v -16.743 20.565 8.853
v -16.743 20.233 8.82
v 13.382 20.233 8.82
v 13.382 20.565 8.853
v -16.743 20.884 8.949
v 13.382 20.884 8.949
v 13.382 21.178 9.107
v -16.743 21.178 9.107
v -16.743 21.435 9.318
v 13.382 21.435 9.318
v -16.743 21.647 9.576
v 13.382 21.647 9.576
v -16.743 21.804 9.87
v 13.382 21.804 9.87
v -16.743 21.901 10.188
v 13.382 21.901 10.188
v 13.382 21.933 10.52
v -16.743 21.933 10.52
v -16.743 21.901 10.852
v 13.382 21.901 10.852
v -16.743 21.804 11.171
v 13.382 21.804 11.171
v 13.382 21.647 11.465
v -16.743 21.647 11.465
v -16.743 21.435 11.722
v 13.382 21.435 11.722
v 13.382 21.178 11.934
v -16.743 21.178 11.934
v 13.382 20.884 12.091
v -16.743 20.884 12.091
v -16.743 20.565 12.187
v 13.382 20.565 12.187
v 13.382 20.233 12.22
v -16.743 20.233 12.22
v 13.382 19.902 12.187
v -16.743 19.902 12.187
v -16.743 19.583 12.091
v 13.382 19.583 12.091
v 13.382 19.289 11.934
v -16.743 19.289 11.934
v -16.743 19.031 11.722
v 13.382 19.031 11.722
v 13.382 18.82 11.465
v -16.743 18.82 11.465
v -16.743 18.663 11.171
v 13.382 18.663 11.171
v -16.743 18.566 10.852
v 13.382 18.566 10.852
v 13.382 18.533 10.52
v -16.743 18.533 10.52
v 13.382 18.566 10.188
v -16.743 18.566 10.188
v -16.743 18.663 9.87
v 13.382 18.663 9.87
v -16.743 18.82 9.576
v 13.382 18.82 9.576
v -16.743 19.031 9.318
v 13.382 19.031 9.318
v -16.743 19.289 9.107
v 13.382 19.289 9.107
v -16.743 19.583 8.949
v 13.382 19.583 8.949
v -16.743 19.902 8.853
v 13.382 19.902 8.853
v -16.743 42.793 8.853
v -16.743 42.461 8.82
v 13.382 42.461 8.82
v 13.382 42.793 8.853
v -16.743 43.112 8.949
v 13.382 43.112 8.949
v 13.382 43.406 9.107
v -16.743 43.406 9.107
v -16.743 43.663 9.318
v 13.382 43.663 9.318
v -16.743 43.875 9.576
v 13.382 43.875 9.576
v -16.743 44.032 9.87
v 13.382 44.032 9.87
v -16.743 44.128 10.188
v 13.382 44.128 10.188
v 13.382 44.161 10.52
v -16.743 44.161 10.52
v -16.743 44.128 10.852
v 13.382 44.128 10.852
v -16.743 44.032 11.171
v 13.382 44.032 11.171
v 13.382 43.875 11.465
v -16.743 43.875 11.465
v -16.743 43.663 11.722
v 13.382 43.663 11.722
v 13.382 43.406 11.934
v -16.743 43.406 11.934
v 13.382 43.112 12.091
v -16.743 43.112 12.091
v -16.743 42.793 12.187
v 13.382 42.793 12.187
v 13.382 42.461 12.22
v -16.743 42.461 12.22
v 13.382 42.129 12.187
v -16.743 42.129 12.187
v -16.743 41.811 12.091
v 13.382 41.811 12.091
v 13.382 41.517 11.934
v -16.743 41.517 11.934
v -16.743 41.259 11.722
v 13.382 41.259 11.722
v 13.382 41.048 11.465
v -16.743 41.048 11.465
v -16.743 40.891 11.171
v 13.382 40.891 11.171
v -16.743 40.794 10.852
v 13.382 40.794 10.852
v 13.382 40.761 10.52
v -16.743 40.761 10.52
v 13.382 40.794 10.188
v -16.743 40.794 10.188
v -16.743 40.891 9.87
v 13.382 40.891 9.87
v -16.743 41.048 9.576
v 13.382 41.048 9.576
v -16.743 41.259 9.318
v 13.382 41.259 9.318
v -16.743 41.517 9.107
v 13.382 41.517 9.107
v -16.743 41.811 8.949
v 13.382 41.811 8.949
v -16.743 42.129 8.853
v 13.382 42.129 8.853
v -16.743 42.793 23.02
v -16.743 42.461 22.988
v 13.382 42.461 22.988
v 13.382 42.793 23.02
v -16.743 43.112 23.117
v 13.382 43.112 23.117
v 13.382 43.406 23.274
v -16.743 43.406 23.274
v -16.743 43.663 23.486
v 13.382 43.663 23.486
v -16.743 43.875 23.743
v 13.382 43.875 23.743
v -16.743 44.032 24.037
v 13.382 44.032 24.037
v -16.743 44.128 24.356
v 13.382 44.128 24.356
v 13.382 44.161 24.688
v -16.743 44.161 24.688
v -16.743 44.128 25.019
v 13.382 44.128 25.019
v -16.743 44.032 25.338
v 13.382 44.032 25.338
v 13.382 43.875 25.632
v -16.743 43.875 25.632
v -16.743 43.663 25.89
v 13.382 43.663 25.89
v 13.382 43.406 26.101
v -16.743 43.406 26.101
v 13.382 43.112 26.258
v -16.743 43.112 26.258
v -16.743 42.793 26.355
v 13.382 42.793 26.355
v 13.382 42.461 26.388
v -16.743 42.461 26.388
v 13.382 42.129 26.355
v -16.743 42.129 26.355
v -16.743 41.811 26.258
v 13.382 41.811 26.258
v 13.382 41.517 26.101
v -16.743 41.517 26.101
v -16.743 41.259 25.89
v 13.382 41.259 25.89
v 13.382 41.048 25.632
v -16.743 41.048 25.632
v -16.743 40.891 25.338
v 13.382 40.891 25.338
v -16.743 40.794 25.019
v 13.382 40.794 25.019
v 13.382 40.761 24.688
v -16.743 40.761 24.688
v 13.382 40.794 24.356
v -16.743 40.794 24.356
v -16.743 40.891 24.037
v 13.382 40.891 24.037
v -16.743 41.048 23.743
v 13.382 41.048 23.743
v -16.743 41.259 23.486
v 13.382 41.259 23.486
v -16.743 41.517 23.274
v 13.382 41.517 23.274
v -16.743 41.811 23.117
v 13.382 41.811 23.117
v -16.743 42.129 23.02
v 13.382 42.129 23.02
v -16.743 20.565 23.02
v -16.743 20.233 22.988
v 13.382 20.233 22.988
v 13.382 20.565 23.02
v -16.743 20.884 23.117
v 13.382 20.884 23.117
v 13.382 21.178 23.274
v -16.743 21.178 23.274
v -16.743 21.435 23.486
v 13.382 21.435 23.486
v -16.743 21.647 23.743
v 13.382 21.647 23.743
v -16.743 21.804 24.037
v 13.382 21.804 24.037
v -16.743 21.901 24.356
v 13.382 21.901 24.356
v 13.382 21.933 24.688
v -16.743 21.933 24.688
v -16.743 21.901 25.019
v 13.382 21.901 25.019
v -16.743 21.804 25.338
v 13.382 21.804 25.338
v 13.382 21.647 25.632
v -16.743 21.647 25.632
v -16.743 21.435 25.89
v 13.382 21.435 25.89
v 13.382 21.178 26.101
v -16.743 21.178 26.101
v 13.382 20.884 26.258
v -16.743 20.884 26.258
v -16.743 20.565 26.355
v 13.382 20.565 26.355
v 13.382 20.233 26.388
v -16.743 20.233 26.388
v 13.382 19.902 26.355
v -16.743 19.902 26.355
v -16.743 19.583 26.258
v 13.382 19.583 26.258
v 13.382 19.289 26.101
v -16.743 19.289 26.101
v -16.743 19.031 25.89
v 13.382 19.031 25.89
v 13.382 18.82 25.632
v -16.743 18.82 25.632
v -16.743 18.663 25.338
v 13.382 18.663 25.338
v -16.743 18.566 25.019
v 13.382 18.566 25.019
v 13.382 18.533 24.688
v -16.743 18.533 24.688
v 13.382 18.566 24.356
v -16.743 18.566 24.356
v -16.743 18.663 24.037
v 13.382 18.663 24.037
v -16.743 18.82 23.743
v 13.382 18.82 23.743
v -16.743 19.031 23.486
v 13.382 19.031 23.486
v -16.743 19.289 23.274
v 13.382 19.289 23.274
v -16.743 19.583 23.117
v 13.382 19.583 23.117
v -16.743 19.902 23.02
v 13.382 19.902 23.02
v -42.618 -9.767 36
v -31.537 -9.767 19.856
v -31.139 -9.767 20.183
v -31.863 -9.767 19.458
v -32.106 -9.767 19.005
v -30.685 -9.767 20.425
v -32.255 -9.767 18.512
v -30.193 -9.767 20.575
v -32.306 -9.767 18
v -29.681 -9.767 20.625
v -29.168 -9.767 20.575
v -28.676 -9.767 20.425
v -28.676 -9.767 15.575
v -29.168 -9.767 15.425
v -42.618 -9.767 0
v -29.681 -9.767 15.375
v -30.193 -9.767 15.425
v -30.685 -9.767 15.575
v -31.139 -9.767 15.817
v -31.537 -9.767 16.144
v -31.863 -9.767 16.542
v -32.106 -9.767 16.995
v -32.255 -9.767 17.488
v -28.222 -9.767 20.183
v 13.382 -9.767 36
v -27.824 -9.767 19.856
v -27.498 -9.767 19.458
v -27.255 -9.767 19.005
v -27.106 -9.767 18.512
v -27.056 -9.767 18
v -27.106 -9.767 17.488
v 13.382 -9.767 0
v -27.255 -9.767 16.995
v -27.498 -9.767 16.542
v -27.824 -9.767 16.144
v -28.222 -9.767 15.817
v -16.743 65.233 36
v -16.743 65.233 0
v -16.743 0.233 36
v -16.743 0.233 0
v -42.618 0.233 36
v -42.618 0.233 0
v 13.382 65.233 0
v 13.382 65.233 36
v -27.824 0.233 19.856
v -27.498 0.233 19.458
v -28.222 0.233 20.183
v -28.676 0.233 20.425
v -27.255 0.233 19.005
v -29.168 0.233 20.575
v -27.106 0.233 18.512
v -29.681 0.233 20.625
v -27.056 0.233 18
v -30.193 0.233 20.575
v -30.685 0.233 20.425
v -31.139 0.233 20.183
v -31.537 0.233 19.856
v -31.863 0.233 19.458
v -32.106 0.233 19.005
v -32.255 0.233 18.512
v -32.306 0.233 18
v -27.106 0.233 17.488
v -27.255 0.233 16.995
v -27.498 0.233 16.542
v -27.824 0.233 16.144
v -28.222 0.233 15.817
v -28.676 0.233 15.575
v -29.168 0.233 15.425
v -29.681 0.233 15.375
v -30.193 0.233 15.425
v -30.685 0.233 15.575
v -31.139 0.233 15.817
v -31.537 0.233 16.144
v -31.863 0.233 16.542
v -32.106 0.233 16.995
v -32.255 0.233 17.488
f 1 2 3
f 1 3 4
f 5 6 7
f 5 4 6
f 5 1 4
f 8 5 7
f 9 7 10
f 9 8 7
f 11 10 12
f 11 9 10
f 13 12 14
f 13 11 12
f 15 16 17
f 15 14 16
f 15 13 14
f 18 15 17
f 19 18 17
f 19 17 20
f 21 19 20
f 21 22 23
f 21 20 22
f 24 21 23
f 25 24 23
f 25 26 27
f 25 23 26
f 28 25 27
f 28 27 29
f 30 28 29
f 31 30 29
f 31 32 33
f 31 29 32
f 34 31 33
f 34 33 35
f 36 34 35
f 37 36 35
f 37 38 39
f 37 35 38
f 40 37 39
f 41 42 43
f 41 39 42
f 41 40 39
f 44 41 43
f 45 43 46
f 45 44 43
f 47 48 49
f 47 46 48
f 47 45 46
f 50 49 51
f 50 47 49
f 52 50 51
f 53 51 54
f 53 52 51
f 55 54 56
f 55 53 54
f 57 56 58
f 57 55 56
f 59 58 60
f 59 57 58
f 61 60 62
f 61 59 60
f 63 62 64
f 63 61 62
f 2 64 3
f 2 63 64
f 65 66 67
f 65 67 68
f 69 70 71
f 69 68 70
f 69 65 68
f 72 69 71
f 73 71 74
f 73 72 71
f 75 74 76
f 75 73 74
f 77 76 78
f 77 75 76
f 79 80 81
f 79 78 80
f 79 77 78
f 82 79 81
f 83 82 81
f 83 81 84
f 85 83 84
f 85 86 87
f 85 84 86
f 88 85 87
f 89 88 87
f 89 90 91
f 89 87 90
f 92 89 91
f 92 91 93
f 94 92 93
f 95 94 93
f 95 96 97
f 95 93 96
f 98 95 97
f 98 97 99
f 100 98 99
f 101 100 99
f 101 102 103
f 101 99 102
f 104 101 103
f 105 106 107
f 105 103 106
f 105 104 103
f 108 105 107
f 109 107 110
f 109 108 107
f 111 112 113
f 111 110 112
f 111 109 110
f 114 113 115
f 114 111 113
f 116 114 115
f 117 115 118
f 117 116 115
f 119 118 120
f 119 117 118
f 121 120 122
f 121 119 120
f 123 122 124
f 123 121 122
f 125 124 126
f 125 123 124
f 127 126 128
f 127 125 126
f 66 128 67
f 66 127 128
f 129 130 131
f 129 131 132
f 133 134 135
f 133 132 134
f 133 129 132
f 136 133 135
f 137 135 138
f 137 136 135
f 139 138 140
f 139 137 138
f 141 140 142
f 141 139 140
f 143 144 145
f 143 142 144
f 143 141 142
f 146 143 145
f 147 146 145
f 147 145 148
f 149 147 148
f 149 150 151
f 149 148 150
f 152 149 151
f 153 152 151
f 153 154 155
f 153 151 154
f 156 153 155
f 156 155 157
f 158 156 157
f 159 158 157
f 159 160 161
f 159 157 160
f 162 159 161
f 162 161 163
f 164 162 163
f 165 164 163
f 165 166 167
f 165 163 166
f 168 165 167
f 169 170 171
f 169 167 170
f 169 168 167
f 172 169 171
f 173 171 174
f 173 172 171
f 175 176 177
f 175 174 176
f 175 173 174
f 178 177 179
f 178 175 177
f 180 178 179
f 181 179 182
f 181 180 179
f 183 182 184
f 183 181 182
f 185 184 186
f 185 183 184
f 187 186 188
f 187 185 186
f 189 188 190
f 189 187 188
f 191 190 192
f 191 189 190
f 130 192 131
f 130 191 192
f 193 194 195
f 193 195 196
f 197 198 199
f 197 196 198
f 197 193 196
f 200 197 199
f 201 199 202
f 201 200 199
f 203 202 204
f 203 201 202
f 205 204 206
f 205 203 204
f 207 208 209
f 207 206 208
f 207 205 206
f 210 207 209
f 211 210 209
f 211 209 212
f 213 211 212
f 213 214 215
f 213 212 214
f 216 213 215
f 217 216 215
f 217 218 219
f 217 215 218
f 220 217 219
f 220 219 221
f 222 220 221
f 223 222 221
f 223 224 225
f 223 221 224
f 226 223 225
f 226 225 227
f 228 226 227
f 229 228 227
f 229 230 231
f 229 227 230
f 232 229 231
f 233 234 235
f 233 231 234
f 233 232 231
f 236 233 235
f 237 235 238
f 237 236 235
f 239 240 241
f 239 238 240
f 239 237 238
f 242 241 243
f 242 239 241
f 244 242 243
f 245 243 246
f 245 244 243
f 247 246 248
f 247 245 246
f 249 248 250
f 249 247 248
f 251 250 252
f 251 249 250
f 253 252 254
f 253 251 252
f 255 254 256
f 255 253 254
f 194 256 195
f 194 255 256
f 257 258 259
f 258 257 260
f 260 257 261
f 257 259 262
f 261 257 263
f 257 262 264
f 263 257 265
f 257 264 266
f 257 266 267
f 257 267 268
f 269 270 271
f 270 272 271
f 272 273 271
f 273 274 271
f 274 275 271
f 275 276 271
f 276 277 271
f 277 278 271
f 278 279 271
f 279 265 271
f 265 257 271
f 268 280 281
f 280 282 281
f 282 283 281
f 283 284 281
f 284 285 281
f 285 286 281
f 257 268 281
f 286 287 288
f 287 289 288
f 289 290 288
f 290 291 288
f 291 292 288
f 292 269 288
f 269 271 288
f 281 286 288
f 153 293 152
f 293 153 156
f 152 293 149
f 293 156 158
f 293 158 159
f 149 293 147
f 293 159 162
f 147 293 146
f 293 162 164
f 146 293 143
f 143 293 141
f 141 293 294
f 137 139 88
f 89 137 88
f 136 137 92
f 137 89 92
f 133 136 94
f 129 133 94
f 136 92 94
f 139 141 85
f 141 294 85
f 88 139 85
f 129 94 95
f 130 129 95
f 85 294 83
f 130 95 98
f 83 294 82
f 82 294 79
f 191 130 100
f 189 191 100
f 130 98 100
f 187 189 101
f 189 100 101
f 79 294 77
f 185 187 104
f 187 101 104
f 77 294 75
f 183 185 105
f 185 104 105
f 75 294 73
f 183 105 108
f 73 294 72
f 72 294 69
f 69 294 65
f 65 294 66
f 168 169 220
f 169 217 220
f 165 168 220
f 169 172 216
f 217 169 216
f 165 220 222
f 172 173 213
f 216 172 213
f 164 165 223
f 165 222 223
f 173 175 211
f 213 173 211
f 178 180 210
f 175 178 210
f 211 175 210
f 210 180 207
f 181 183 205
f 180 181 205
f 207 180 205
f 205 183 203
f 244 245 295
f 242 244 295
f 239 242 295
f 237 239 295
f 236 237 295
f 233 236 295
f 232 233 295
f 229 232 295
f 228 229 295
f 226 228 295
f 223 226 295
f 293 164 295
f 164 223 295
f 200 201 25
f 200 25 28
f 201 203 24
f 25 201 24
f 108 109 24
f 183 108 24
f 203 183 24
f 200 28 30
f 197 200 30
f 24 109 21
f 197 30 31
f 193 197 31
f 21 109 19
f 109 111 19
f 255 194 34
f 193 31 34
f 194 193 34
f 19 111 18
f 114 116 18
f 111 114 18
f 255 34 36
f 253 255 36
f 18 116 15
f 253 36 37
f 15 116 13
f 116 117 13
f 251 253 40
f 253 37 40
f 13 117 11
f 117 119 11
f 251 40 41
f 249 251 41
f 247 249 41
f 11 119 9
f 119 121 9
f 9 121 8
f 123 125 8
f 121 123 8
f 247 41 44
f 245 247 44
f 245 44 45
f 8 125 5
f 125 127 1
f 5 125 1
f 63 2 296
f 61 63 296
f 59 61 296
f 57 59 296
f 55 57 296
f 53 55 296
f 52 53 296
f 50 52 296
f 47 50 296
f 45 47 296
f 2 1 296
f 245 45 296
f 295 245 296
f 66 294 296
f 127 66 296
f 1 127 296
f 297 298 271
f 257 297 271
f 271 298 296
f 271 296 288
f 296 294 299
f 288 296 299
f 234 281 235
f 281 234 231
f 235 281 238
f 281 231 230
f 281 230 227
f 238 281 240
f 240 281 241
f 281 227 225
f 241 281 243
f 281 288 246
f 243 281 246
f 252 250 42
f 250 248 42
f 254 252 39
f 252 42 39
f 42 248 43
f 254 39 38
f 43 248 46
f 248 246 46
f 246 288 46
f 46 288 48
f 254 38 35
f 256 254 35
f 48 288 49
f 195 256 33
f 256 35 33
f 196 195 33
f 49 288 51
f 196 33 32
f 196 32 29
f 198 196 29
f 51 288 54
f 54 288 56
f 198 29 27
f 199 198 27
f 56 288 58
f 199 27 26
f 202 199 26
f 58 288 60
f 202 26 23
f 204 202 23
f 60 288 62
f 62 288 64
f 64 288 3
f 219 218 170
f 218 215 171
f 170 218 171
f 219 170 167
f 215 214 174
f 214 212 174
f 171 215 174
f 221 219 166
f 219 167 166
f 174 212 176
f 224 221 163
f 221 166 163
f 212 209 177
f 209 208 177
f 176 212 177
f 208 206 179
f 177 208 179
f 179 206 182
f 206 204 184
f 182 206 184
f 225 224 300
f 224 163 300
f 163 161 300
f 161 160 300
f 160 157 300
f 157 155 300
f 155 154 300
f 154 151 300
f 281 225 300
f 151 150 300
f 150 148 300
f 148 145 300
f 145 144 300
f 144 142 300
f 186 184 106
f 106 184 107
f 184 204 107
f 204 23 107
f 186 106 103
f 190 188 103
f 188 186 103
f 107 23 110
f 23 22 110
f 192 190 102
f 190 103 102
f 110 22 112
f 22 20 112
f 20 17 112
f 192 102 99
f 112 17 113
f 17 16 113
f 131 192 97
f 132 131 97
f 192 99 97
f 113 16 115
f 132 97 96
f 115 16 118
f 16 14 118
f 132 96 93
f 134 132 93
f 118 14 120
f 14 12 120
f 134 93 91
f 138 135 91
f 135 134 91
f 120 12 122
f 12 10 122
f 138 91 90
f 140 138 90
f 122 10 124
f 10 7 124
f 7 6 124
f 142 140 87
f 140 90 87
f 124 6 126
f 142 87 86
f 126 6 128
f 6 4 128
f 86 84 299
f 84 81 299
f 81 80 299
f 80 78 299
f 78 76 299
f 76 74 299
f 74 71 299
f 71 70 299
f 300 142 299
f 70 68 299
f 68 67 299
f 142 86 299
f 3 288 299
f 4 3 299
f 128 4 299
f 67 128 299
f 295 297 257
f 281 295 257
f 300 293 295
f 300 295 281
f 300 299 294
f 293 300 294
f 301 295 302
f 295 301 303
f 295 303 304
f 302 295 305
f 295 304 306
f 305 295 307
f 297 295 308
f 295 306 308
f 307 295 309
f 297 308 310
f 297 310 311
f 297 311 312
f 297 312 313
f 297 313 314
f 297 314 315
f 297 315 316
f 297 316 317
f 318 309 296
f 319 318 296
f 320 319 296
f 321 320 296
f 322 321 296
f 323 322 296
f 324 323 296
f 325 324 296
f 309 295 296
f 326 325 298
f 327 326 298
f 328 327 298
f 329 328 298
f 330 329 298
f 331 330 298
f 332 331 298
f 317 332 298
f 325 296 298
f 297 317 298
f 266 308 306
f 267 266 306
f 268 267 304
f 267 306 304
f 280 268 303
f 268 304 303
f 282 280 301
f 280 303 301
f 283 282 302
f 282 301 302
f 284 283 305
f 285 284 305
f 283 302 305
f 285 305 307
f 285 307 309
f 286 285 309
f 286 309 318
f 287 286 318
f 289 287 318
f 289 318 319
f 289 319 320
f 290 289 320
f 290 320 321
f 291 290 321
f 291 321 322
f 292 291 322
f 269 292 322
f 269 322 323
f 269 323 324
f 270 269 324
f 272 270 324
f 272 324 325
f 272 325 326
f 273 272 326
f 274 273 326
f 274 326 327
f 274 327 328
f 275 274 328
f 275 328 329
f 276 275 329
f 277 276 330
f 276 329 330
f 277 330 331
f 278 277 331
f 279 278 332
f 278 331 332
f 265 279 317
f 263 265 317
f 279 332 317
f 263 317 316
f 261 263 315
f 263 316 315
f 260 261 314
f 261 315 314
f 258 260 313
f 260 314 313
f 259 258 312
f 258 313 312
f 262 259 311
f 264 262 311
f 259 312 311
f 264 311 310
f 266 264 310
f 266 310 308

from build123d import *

# Parameters (mm, degrees)
BOSS_EXTRUDE1_DEPTH     = 36
SKETCH2_R               = 2.625
CUT_EXTRUDE1_DEPTH      = 86.658085492
CUT_EXTRUDE2_DEPTH      = 94.206160811
CUT_EXTRUDE2_DEPTH_BACK = 94.206160811
SKETCH3_R               = 1.7


with BuildPart() as part:
    # Sketch1 → Boss-Extrude1 (new body)
    with BuildSketch(Plane.XY):
        Polygon((-42.618160568, 0.233338203), (-42.618160568, -9.766661797), (13.381839432, -9.766661797), (13.381839432, 65.233338203), (-16.742848795, 65.233338203), (-16.742848795, 0.233338203), align=None)
    extrude(amount=BOSS_EXTRUDE1_DEPTH)

    # Sketch2 → Cut-Extrude1 (cut, through all)
    with BuildSketch(Plane(origin=(0, 0.233338203, 0), x_dir=(1, 0, 0), z_dir=(0, 1, 0))):
        with Locations(Location((-29.680504682, -18, 0), (0, 0, 270))):
            Circle(SKETCH2_R)
    extrude(amount=-CUT_EXTRUDE1_DEPTH, mode=Mode.SUBTRACT)

    # Sketch3 → Cut-Extrude2 (cut, two sides: drawn at the far end of the back side and taken through both)
    with BuildSketch(Plane(origin=(13.381839432, 0, 0), x_dir=(0, 0, -1), z_dir=(1, 0, 0)).offset(-CUT_EXTRUDE2_DEPTH_BACK)):
        with Locations((-24.687630005, 20.233338203)):
            Circle(SKETCH3_R)
        with Locations((-10.520088066, 20.233338203)):
            Circle(SKETCH3_R)
        with Locations((-24.687630005, 42.461110081)):
            Circle(SKETCH3_R)
        with Locations((-10.520088066, 42.461110081)):
            Circle(SKETCH3_R)
    extrude(amount=CUT_EXTRUDE2_DEPTH + CUT_EXTRUDE2_DEPTH_BACK, mode=Mode.SUBTRACT)


solid = part.part
